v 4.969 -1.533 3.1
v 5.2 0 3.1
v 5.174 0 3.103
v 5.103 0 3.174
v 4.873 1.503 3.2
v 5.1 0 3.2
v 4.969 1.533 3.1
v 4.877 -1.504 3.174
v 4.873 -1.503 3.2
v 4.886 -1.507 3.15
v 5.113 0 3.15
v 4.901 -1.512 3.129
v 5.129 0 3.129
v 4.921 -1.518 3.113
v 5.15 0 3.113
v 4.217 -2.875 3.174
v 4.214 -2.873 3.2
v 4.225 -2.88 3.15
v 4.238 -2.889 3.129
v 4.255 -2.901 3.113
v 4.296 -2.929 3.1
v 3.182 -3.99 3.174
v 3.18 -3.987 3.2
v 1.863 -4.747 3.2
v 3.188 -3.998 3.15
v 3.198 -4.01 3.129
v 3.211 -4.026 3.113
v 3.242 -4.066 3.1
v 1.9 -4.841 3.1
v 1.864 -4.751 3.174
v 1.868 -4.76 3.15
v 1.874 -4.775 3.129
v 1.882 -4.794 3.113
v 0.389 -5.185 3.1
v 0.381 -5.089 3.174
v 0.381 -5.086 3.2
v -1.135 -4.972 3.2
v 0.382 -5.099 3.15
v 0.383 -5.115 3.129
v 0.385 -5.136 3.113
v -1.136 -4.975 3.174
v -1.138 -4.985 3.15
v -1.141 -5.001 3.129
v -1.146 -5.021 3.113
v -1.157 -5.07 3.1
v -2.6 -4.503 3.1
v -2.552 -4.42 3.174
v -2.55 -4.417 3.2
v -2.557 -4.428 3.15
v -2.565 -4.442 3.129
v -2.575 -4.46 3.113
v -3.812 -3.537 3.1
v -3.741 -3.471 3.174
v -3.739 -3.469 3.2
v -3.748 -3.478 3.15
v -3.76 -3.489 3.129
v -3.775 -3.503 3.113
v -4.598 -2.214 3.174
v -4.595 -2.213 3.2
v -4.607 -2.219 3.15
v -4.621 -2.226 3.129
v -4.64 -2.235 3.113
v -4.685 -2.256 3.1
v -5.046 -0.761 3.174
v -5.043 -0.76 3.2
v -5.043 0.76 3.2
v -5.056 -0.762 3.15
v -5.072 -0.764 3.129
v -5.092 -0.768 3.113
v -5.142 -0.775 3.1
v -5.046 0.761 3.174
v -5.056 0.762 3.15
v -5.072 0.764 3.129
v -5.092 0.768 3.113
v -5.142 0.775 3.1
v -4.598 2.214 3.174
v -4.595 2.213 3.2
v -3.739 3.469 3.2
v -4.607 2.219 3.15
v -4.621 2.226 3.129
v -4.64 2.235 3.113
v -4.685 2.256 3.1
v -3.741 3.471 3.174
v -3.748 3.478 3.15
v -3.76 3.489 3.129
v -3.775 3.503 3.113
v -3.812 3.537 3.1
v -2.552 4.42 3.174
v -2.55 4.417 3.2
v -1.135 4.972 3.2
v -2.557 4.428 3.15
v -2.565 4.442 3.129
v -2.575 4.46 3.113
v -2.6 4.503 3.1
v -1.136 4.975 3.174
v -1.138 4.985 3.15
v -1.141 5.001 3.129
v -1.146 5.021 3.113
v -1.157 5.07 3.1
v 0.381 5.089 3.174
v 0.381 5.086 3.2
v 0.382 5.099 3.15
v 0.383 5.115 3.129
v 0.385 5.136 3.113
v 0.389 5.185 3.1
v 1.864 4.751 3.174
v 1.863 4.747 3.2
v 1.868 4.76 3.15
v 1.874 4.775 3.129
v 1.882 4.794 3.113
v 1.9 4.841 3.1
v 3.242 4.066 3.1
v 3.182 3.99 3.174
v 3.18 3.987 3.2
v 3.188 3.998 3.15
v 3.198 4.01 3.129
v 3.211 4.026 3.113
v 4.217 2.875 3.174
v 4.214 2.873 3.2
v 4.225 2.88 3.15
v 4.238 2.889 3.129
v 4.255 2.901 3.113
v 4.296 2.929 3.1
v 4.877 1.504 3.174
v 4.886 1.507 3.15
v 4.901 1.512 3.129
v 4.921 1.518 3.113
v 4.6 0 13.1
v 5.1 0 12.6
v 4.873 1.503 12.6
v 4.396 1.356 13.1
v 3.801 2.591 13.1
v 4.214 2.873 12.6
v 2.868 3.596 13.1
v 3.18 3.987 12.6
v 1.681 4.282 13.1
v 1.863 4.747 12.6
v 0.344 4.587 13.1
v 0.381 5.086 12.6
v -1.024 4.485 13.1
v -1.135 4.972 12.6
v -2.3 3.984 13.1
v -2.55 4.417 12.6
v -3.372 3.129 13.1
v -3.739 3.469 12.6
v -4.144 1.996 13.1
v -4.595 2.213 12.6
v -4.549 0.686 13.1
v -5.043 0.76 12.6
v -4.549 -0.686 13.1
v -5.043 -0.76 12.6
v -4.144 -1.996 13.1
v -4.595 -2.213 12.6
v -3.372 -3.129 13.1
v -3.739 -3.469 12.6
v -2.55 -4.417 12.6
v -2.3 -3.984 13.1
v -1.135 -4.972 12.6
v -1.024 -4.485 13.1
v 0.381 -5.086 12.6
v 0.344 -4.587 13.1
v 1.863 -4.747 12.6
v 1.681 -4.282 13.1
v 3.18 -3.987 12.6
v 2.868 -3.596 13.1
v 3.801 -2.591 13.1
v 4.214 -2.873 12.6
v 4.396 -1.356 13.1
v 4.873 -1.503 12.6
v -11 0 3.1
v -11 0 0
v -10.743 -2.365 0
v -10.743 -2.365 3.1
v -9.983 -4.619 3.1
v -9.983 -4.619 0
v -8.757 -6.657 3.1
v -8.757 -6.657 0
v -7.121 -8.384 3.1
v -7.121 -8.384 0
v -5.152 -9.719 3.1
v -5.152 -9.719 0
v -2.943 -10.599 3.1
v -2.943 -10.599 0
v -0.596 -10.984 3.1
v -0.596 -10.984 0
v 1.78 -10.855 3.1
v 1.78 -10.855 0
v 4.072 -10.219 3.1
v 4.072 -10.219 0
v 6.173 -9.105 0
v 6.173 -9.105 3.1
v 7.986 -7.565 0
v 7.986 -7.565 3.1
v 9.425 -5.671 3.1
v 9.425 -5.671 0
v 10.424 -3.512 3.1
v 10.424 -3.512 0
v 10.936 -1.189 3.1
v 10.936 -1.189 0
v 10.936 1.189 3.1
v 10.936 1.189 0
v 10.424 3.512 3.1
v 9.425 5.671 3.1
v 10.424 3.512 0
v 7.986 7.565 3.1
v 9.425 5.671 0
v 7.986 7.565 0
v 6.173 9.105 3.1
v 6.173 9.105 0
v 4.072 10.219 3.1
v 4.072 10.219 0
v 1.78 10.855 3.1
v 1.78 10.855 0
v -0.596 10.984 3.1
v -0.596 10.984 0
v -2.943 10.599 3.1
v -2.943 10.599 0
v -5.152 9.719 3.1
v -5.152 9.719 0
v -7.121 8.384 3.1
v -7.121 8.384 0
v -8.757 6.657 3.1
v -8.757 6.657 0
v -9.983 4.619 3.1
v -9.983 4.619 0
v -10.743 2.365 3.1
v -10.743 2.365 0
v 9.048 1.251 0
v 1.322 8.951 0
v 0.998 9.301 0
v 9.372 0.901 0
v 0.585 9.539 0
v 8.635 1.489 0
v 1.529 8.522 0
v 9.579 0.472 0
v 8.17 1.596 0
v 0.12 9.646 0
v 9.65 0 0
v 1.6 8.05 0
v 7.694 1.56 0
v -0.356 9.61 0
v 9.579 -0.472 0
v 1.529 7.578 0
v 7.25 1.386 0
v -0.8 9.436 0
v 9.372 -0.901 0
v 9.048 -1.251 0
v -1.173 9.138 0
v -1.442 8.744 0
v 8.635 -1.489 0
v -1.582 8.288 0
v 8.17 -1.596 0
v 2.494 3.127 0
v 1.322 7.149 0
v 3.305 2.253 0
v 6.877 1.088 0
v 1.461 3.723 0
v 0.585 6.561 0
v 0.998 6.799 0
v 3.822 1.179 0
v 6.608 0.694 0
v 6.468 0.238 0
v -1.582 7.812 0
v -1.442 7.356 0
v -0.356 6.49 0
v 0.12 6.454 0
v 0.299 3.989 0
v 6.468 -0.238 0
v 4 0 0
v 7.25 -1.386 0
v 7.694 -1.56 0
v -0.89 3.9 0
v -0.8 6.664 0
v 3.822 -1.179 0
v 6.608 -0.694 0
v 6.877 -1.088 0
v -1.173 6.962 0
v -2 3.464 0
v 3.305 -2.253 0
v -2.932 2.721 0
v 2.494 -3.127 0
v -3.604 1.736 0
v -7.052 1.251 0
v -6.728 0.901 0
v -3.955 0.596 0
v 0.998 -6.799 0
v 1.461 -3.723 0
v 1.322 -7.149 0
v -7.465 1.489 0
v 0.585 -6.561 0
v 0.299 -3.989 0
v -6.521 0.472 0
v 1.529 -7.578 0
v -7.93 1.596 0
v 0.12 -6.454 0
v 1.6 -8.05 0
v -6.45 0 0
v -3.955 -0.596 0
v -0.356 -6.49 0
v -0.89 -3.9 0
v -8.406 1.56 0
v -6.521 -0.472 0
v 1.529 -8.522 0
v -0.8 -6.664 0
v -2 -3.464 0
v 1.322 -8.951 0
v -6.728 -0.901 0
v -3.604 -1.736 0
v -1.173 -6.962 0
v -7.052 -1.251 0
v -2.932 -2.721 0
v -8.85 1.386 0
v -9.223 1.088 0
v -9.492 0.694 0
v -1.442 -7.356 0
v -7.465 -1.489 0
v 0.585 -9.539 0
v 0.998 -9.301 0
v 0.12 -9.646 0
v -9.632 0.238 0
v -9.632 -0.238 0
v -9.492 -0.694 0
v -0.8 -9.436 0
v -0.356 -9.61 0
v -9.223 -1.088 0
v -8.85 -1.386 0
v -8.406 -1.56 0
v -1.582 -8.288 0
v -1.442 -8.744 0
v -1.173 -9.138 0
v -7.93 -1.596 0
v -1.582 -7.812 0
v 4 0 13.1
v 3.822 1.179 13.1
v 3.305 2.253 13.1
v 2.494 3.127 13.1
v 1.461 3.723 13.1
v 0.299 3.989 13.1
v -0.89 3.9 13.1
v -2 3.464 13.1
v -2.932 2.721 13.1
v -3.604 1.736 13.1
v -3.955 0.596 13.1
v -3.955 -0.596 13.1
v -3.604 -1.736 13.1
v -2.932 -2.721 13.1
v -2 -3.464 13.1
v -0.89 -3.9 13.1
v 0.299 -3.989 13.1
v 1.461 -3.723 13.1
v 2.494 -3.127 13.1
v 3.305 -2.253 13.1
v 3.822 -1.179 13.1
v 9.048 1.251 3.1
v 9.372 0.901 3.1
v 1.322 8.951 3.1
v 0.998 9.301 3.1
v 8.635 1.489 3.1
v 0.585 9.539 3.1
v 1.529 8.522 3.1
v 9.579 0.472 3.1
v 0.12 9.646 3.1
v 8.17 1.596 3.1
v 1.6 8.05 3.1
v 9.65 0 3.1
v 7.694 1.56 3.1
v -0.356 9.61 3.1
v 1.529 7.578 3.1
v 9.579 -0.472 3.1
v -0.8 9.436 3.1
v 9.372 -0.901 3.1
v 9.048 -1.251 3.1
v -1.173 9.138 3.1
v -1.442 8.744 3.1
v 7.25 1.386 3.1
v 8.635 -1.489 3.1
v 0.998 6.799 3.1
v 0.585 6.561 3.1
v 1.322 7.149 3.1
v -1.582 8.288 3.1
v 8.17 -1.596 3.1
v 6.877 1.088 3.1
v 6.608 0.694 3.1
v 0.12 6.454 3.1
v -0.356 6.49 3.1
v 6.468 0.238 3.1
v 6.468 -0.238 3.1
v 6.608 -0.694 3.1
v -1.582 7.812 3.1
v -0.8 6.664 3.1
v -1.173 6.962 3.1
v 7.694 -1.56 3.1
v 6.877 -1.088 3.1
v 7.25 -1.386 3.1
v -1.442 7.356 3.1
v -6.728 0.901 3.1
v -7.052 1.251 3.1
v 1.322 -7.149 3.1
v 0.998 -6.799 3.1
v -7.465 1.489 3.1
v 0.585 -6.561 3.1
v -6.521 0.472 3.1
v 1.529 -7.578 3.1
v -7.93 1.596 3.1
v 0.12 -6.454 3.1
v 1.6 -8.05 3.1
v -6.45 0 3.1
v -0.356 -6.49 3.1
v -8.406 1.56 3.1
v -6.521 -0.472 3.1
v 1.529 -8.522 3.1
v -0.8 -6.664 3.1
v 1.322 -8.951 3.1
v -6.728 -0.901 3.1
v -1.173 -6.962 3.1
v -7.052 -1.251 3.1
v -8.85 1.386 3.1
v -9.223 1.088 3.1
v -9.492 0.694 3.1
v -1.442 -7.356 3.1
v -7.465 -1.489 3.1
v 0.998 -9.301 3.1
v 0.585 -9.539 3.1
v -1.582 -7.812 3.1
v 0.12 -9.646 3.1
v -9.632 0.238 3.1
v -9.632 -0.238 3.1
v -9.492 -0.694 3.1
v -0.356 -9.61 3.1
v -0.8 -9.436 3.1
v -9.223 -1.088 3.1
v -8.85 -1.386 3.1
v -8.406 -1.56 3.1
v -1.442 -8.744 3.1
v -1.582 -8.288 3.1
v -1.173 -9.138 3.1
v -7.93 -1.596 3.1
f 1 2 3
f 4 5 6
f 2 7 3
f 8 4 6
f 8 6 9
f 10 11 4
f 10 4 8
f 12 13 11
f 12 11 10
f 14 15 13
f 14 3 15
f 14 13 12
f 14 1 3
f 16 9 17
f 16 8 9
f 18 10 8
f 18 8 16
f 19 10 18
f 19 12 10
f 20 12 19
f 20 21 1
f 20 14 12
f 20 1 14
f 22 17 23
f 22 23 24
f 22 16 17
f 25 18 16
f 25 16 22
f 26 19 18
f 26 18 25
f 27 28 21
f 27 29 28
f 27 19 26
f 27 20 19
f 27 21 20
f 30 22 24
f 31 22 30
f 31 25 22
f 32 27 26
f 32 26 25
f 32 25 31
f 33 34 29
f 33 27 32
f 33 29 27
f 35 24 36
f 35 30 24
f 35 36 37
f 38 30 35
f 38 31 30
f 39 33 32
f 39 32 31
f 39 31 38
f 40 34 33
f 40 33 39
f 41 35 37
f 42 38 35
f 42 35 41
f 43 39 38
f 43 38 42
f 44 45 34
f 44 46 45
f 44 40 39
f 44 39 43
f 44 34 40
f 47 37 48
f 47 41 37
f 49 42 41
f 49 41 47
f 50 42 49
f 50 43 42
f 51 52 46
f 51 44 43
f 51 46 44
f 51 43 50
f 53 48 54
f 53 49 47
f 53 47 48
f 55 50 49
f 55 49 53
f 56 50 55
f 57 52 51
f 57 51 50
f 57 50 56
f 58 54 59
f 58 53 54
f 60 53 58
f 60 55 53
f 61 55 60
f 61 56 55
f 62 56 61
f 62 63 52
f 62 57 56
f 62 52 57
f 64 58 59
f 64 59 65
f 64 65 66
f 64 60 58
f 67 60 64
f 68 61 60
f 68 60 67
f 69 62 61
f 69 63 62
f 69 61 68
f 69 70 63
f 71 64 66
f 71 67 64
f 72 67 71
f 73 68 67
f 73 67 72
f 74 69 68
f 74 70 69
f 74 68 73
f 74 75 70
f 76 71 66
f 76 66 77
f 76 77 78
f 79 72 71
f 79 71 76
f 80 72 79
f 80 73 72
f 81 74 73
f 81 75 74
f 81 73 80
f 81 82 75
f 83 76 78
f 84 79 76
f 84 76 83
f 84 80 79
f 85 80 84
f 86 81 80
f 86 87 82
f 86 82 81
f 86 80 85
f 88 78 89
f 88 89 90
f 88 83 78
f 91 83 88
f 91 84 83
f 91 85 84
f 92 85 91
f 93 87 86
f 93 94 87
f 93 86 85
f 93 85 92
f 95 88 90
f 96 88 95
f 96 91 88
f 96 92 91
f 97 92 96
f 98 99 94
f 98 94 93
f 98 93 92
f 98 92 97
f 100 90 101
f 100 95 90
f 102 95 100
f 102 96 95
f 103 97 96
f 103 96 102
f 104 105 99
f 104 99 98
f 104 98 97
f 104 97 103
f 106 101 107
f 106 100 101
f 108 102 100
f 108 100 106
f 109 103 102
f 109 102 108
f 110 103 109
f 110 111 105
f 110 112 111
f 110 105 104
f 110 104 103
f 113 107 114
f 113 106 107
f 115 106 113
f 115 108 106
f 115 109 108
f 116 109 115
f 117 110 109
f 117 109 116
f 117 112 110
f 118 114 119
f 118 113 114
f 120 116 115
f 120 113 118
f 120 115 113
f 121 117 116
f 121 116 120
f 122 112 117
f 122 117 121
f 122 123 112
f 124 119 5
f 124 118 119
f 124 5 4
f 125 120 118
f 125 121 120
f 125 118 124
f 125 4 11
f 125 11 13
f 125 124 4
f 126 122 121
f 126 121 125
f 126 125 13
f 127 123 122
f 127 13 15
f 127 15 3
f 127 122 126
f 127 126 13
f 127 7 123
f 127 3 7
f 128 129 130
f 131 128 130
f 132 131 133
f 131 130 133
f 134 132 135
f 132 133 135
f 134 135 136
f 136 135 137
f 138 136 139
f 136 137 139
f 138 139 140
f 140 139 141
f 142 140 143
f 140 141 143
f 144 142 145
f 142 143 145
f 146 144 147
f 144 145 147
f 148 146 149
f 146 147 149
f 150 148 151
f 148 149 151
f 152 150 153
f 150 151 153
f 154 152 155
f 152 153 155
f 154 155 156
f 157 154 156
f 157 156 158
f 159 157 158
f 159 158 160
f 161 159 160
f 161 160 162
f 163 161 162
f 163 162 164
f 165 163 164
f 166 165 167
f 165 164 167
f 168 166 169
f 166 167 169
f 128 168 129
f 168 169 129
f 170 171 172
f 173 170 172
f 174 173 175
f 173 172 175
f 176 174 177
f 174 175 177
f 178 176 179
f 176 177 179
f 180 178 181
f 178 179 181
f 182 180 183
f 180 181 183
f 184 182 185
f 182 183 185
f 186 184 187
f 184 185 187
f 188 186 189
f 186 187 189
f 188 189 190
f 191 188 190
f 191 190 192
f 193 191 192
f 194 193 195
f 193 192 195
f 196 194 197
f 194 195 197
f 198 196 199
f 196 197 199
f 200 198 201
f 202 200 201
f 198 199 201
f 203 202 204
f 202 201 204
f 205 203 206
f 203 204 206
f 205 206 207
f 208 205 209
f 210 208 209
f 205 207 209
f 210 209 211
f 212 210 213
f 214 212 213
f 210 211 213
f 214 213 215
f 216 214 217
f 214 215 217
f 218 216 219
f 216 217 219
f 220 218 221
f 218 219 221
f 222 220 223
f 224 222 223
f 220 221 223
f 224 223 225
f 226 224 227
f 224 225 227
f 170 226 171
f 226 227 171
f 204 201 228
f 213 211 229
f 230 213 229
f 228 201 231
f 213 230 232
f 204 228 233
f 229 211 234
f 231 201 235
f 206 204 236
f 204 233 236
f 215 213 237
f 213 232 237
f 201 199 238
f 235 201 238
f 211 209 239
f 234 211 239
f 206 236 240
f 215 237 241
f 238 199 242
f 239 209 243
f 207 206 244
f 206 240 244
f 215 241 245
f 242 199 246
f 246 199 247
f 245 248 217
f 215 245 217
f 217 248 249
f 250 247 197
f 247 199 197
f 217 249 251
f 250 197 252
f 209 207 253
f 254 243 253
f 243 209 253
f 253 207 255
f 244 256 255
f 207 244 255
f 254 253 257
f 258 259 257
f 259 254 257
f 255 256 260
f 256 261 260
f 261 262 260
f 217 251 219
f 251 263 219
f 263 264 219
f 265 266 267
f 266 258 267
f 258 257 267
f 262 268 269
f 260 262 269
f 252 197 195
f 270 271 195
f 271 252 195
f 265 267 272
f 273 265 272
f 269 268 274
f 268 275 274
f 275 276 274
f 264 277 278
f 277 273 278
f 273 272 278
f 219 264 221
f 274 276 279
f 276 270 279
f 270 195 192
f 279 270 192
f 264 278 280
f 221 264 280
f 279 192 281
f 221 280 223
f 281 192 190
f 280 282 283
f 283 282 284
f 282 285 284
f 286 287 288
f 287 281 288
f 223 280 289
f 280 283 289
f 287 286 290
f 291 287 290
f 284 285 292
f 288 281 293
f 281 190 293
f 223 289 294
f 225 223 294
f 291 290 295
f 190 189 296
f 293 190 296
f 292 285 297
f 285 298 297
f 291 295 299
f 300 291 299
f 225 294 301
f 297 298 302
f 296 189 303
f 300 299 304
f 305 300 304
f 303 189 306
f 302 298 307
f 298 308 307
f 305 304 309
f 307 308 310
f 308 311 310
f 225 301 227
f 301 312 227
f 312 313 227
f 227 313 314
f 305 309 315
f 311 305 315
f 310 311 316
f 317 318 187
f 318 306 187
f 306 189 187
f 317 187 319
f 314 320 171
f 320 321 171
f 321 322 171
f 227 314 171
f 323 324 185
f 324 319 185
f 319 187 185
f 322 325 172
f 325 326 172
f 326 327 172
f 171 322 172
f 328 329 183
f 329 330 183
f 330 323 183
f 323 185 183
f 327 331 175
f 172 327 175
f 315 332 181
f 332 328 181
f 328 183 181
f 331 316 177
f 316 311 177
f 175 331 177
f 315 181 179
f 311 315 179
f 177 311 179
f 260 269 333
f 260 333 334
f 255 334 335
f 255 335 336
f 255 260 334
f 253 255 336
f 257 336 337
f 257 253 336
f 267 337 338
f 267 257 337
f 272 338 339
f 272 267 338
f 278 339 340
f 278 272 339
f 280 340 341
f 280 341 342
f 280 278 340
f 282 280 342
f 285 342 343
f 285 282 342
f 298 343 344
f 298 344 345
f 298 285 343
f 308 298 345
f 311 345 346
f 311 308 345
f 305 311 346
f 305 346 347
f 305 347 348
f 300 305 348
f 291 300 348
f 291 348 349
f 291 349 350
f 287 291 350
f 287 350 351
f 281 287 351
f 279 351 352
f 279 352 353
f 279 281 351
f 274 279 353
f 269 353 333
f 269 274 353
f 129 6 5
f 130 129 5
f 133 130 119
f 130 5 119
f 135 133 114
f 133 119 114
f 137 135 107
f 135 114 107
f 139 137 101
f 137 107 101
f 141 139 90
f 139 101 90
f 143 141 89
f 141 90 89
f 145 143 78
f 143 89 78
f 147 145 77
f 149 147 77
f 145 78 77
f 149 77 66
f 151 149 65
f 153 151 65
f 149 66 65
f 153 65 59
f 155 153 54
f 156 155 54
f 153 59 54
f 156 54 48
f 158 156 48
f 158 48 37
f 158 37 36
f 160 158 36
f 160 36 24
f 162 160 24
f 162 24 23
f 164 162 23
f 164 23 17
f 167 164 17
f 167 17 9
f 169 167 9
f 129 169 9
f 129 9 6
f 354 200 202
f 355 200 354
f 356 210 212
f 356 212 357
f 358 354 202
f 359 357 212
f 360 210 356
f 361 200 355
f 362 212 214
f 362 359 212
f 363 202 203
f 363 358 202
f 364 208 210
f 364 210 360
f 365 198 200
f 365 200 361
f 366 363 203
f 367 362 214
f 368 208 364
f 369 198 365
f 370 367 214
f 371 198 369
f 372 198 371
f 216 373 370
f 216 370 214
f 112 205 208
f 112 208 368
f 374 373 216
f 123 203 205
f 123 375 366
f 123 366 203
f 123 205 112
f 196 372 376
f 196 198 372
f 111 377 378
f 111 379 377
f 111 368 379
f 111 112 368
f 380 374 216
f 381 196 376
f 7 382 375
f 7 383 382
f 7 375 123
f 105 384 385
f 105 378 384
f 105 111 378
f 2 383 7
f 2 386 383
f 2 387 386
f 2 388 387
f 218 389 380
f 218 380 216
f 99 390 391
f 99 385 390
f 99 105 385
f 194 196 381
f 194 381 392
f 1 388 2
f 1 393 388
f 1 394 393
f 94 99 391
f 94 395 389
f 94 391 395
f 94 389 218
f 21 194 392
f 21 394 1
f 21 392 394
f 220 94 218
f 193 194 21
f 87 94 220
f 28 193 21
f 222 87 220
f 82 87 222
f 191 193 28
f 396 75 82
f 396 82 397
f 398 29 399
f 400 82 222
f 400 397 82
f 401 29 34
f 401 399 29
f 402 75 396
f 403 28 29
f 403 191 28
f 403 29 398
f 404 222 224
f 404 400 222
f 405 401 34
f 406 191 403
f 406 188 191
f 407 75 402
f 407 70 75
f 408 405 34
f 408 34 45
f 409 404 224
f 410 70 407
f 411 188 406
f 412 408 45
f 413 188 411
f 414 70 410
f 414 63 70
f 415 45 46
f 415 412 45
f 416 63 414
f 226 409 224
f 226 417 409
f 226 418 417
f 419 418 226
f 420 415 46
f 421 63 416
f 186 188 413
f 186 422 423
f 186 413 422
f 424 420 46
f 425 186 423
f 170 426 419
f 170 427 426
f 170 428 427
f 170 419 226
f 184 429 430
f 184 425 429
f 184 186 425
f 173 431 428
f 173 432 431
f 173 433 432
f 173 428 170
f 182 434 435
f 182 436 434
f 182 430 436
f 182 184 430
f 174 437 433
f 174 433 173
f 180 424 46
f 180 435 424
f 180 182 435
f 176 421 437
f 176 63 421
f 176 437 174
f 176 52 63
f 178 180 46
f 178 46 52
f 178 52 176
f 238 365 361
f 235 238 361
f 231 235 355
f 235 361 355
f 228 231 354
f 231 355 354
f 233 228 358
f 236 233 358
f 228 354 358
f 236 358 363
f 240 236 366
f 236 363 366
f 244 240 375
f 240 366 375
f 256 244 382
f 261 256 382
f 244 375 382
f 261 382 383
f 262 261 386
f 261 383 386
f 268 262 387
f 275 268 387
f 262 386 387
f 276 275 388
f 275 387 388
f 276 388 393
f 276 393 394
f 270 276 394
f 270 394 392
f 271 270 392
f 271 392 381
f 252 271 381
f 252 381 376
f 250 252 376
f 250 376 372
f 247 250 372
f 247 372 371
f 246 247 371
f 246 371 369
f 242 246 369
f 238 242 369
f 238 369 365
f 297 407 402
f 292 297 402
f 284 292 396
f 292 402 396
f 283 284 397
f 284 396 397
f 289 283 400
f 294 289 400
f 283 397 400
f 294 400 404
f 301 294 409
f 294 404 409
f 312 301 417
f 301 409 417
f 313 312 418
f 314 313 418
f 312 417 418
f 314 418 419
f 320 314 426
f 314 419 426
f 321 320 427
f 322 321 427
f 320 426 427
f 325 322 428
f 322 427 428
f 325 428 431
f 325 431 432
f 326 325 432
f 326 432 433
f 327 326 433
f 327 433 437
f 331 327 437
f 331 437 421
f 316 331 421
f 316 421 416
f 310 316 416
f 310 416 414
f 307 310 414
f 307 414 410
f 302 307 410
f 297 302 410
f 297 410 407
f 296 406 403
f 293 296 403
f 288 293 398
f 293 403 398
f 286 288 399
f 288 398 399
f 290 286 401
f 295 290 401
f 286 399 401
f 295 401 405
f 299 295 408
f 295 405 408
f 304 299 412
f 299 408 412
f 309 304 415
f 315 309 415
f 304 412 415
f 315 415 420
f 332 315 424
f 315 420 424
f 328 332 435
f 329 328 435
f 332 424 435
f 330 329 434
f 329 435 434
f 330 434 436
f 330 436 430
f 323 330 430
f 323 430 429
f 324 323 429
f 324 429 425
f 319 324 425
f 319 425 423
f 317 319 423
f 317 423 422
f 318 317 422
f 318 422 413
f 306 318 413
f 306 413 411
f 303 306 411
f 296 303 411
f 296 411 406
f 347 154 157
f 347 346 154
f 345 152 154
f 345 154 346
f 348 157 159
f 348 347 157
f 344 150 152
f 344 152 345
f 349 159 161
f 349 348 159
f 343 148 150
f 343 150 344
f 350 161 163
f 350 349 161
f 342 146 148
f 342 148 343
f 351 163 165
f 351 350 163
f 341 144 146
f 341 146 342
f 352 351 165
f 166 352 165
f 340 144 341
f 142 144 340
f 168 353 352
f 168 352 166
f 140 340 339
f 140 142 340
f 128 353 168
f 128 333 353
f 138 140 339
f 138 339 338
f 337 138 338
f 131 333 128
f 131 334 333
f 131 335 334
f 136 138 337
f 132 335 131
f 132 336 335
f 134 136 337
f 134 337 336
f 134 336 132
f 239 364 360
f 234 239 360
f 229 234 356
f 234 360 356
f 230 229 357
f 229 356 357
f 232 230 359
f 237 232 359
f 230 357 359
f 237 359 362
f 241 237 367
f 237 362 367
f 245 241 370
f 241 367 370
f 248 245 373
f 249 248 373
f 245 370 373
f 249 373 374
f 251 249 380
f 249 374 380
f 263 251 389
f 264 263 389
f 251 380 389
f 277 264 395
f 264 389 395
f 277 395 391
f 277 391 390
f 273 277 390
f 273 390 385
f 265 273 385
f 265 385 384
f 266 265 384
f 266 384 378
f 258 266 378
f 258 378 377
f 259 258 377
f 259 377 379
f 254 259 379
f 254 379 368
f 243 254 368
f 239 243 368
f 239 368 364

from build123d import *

# Parameters (mm, degrees)
SKETCH1_R                = 11
SKETCH1_R_2              = 5.075
BOSS_EXTRUDE1_DEPTH      = 3.1
BOSS_EXTRUDE2_DEPTH      = 10
BOSS_EXTRUDE2_DEPTH_BACK = 3.1
SKETCH2_R                = 5.1
SKETCH2_R_2              = 4
CHAMFER1_SIZE            = 0.5
FILLET1_R                = 0.1
SKETCH3_R                = 1.6
CUT_EXTRUDE1_DEPTH       = 10


with BuildPart() as part:
    # Sketch1 → Boss-Extrude1 (new body)
    with BuildSketch(Plane.XY):
        with Locations(Location((0, 0, 0), (0, 0, 180))):
            Circle(SKETCH1_R)
        with Locations(Location((0, 0, 0), (0, 0, 180))):
            Circle(SKETCH1_R_2, mode=Mode.SUBTRACT)
    extrude(amount=BOSS_EXTRUDE1_DEPTH)

    # Sketch2 → Boss-Extrude2 (add, two sides: drawn at the far end of the back side and taken through both)
    with BuildSketch(Plane.XY.offset(3.1).offset(-BOSS_EXTRUDE2_DEPTH_BACK)):
        Circle(SKETCH2_R)
        Circle(SKETCH2_R_2, mode=Mode.SUBTRACT)
    extrude(amount=BOSS_EXTRUDE2_DEPTH + BOSS_EXTRUDE2_DEPTH_BACK)

    # Chamfer1
    chamfer1_edges = [part.edges().sort_by_distance(p)[0] for p in [
        (-5.1, 0, 13.1),
    ]]
    chamfer(chamfer1_edges, length=CHAMFER1_SIZE)

    # Fillet1
    fillet1_edges = [part.edges().sort_by_distance(p)[0] for p in [
        (-5.1, 0, 3.1),
    ]]
    fillet(fillet1_edges, radius=FILLET1_R)

    # Sketch3 → Cut-Extrude1 (cut)
    with BuildSketch(Plane.XY.offset(3.1)):
        with Locations((0, 8.05)):
            Circle(SKETCH3_R)
        with Locations((8.05, 0)):
            Circle(SKETCH3_R)
        with Locations((0, -8.05)):
            Circle(SKETCH3_R)
        with Locations((-8.05, 0)):
            Circle(SKETCH3_R)
    extrude(amount=-CUT_EXTRUDE1_DEPTH, mode=Mode.SUBTRACT)


solid = part.part
